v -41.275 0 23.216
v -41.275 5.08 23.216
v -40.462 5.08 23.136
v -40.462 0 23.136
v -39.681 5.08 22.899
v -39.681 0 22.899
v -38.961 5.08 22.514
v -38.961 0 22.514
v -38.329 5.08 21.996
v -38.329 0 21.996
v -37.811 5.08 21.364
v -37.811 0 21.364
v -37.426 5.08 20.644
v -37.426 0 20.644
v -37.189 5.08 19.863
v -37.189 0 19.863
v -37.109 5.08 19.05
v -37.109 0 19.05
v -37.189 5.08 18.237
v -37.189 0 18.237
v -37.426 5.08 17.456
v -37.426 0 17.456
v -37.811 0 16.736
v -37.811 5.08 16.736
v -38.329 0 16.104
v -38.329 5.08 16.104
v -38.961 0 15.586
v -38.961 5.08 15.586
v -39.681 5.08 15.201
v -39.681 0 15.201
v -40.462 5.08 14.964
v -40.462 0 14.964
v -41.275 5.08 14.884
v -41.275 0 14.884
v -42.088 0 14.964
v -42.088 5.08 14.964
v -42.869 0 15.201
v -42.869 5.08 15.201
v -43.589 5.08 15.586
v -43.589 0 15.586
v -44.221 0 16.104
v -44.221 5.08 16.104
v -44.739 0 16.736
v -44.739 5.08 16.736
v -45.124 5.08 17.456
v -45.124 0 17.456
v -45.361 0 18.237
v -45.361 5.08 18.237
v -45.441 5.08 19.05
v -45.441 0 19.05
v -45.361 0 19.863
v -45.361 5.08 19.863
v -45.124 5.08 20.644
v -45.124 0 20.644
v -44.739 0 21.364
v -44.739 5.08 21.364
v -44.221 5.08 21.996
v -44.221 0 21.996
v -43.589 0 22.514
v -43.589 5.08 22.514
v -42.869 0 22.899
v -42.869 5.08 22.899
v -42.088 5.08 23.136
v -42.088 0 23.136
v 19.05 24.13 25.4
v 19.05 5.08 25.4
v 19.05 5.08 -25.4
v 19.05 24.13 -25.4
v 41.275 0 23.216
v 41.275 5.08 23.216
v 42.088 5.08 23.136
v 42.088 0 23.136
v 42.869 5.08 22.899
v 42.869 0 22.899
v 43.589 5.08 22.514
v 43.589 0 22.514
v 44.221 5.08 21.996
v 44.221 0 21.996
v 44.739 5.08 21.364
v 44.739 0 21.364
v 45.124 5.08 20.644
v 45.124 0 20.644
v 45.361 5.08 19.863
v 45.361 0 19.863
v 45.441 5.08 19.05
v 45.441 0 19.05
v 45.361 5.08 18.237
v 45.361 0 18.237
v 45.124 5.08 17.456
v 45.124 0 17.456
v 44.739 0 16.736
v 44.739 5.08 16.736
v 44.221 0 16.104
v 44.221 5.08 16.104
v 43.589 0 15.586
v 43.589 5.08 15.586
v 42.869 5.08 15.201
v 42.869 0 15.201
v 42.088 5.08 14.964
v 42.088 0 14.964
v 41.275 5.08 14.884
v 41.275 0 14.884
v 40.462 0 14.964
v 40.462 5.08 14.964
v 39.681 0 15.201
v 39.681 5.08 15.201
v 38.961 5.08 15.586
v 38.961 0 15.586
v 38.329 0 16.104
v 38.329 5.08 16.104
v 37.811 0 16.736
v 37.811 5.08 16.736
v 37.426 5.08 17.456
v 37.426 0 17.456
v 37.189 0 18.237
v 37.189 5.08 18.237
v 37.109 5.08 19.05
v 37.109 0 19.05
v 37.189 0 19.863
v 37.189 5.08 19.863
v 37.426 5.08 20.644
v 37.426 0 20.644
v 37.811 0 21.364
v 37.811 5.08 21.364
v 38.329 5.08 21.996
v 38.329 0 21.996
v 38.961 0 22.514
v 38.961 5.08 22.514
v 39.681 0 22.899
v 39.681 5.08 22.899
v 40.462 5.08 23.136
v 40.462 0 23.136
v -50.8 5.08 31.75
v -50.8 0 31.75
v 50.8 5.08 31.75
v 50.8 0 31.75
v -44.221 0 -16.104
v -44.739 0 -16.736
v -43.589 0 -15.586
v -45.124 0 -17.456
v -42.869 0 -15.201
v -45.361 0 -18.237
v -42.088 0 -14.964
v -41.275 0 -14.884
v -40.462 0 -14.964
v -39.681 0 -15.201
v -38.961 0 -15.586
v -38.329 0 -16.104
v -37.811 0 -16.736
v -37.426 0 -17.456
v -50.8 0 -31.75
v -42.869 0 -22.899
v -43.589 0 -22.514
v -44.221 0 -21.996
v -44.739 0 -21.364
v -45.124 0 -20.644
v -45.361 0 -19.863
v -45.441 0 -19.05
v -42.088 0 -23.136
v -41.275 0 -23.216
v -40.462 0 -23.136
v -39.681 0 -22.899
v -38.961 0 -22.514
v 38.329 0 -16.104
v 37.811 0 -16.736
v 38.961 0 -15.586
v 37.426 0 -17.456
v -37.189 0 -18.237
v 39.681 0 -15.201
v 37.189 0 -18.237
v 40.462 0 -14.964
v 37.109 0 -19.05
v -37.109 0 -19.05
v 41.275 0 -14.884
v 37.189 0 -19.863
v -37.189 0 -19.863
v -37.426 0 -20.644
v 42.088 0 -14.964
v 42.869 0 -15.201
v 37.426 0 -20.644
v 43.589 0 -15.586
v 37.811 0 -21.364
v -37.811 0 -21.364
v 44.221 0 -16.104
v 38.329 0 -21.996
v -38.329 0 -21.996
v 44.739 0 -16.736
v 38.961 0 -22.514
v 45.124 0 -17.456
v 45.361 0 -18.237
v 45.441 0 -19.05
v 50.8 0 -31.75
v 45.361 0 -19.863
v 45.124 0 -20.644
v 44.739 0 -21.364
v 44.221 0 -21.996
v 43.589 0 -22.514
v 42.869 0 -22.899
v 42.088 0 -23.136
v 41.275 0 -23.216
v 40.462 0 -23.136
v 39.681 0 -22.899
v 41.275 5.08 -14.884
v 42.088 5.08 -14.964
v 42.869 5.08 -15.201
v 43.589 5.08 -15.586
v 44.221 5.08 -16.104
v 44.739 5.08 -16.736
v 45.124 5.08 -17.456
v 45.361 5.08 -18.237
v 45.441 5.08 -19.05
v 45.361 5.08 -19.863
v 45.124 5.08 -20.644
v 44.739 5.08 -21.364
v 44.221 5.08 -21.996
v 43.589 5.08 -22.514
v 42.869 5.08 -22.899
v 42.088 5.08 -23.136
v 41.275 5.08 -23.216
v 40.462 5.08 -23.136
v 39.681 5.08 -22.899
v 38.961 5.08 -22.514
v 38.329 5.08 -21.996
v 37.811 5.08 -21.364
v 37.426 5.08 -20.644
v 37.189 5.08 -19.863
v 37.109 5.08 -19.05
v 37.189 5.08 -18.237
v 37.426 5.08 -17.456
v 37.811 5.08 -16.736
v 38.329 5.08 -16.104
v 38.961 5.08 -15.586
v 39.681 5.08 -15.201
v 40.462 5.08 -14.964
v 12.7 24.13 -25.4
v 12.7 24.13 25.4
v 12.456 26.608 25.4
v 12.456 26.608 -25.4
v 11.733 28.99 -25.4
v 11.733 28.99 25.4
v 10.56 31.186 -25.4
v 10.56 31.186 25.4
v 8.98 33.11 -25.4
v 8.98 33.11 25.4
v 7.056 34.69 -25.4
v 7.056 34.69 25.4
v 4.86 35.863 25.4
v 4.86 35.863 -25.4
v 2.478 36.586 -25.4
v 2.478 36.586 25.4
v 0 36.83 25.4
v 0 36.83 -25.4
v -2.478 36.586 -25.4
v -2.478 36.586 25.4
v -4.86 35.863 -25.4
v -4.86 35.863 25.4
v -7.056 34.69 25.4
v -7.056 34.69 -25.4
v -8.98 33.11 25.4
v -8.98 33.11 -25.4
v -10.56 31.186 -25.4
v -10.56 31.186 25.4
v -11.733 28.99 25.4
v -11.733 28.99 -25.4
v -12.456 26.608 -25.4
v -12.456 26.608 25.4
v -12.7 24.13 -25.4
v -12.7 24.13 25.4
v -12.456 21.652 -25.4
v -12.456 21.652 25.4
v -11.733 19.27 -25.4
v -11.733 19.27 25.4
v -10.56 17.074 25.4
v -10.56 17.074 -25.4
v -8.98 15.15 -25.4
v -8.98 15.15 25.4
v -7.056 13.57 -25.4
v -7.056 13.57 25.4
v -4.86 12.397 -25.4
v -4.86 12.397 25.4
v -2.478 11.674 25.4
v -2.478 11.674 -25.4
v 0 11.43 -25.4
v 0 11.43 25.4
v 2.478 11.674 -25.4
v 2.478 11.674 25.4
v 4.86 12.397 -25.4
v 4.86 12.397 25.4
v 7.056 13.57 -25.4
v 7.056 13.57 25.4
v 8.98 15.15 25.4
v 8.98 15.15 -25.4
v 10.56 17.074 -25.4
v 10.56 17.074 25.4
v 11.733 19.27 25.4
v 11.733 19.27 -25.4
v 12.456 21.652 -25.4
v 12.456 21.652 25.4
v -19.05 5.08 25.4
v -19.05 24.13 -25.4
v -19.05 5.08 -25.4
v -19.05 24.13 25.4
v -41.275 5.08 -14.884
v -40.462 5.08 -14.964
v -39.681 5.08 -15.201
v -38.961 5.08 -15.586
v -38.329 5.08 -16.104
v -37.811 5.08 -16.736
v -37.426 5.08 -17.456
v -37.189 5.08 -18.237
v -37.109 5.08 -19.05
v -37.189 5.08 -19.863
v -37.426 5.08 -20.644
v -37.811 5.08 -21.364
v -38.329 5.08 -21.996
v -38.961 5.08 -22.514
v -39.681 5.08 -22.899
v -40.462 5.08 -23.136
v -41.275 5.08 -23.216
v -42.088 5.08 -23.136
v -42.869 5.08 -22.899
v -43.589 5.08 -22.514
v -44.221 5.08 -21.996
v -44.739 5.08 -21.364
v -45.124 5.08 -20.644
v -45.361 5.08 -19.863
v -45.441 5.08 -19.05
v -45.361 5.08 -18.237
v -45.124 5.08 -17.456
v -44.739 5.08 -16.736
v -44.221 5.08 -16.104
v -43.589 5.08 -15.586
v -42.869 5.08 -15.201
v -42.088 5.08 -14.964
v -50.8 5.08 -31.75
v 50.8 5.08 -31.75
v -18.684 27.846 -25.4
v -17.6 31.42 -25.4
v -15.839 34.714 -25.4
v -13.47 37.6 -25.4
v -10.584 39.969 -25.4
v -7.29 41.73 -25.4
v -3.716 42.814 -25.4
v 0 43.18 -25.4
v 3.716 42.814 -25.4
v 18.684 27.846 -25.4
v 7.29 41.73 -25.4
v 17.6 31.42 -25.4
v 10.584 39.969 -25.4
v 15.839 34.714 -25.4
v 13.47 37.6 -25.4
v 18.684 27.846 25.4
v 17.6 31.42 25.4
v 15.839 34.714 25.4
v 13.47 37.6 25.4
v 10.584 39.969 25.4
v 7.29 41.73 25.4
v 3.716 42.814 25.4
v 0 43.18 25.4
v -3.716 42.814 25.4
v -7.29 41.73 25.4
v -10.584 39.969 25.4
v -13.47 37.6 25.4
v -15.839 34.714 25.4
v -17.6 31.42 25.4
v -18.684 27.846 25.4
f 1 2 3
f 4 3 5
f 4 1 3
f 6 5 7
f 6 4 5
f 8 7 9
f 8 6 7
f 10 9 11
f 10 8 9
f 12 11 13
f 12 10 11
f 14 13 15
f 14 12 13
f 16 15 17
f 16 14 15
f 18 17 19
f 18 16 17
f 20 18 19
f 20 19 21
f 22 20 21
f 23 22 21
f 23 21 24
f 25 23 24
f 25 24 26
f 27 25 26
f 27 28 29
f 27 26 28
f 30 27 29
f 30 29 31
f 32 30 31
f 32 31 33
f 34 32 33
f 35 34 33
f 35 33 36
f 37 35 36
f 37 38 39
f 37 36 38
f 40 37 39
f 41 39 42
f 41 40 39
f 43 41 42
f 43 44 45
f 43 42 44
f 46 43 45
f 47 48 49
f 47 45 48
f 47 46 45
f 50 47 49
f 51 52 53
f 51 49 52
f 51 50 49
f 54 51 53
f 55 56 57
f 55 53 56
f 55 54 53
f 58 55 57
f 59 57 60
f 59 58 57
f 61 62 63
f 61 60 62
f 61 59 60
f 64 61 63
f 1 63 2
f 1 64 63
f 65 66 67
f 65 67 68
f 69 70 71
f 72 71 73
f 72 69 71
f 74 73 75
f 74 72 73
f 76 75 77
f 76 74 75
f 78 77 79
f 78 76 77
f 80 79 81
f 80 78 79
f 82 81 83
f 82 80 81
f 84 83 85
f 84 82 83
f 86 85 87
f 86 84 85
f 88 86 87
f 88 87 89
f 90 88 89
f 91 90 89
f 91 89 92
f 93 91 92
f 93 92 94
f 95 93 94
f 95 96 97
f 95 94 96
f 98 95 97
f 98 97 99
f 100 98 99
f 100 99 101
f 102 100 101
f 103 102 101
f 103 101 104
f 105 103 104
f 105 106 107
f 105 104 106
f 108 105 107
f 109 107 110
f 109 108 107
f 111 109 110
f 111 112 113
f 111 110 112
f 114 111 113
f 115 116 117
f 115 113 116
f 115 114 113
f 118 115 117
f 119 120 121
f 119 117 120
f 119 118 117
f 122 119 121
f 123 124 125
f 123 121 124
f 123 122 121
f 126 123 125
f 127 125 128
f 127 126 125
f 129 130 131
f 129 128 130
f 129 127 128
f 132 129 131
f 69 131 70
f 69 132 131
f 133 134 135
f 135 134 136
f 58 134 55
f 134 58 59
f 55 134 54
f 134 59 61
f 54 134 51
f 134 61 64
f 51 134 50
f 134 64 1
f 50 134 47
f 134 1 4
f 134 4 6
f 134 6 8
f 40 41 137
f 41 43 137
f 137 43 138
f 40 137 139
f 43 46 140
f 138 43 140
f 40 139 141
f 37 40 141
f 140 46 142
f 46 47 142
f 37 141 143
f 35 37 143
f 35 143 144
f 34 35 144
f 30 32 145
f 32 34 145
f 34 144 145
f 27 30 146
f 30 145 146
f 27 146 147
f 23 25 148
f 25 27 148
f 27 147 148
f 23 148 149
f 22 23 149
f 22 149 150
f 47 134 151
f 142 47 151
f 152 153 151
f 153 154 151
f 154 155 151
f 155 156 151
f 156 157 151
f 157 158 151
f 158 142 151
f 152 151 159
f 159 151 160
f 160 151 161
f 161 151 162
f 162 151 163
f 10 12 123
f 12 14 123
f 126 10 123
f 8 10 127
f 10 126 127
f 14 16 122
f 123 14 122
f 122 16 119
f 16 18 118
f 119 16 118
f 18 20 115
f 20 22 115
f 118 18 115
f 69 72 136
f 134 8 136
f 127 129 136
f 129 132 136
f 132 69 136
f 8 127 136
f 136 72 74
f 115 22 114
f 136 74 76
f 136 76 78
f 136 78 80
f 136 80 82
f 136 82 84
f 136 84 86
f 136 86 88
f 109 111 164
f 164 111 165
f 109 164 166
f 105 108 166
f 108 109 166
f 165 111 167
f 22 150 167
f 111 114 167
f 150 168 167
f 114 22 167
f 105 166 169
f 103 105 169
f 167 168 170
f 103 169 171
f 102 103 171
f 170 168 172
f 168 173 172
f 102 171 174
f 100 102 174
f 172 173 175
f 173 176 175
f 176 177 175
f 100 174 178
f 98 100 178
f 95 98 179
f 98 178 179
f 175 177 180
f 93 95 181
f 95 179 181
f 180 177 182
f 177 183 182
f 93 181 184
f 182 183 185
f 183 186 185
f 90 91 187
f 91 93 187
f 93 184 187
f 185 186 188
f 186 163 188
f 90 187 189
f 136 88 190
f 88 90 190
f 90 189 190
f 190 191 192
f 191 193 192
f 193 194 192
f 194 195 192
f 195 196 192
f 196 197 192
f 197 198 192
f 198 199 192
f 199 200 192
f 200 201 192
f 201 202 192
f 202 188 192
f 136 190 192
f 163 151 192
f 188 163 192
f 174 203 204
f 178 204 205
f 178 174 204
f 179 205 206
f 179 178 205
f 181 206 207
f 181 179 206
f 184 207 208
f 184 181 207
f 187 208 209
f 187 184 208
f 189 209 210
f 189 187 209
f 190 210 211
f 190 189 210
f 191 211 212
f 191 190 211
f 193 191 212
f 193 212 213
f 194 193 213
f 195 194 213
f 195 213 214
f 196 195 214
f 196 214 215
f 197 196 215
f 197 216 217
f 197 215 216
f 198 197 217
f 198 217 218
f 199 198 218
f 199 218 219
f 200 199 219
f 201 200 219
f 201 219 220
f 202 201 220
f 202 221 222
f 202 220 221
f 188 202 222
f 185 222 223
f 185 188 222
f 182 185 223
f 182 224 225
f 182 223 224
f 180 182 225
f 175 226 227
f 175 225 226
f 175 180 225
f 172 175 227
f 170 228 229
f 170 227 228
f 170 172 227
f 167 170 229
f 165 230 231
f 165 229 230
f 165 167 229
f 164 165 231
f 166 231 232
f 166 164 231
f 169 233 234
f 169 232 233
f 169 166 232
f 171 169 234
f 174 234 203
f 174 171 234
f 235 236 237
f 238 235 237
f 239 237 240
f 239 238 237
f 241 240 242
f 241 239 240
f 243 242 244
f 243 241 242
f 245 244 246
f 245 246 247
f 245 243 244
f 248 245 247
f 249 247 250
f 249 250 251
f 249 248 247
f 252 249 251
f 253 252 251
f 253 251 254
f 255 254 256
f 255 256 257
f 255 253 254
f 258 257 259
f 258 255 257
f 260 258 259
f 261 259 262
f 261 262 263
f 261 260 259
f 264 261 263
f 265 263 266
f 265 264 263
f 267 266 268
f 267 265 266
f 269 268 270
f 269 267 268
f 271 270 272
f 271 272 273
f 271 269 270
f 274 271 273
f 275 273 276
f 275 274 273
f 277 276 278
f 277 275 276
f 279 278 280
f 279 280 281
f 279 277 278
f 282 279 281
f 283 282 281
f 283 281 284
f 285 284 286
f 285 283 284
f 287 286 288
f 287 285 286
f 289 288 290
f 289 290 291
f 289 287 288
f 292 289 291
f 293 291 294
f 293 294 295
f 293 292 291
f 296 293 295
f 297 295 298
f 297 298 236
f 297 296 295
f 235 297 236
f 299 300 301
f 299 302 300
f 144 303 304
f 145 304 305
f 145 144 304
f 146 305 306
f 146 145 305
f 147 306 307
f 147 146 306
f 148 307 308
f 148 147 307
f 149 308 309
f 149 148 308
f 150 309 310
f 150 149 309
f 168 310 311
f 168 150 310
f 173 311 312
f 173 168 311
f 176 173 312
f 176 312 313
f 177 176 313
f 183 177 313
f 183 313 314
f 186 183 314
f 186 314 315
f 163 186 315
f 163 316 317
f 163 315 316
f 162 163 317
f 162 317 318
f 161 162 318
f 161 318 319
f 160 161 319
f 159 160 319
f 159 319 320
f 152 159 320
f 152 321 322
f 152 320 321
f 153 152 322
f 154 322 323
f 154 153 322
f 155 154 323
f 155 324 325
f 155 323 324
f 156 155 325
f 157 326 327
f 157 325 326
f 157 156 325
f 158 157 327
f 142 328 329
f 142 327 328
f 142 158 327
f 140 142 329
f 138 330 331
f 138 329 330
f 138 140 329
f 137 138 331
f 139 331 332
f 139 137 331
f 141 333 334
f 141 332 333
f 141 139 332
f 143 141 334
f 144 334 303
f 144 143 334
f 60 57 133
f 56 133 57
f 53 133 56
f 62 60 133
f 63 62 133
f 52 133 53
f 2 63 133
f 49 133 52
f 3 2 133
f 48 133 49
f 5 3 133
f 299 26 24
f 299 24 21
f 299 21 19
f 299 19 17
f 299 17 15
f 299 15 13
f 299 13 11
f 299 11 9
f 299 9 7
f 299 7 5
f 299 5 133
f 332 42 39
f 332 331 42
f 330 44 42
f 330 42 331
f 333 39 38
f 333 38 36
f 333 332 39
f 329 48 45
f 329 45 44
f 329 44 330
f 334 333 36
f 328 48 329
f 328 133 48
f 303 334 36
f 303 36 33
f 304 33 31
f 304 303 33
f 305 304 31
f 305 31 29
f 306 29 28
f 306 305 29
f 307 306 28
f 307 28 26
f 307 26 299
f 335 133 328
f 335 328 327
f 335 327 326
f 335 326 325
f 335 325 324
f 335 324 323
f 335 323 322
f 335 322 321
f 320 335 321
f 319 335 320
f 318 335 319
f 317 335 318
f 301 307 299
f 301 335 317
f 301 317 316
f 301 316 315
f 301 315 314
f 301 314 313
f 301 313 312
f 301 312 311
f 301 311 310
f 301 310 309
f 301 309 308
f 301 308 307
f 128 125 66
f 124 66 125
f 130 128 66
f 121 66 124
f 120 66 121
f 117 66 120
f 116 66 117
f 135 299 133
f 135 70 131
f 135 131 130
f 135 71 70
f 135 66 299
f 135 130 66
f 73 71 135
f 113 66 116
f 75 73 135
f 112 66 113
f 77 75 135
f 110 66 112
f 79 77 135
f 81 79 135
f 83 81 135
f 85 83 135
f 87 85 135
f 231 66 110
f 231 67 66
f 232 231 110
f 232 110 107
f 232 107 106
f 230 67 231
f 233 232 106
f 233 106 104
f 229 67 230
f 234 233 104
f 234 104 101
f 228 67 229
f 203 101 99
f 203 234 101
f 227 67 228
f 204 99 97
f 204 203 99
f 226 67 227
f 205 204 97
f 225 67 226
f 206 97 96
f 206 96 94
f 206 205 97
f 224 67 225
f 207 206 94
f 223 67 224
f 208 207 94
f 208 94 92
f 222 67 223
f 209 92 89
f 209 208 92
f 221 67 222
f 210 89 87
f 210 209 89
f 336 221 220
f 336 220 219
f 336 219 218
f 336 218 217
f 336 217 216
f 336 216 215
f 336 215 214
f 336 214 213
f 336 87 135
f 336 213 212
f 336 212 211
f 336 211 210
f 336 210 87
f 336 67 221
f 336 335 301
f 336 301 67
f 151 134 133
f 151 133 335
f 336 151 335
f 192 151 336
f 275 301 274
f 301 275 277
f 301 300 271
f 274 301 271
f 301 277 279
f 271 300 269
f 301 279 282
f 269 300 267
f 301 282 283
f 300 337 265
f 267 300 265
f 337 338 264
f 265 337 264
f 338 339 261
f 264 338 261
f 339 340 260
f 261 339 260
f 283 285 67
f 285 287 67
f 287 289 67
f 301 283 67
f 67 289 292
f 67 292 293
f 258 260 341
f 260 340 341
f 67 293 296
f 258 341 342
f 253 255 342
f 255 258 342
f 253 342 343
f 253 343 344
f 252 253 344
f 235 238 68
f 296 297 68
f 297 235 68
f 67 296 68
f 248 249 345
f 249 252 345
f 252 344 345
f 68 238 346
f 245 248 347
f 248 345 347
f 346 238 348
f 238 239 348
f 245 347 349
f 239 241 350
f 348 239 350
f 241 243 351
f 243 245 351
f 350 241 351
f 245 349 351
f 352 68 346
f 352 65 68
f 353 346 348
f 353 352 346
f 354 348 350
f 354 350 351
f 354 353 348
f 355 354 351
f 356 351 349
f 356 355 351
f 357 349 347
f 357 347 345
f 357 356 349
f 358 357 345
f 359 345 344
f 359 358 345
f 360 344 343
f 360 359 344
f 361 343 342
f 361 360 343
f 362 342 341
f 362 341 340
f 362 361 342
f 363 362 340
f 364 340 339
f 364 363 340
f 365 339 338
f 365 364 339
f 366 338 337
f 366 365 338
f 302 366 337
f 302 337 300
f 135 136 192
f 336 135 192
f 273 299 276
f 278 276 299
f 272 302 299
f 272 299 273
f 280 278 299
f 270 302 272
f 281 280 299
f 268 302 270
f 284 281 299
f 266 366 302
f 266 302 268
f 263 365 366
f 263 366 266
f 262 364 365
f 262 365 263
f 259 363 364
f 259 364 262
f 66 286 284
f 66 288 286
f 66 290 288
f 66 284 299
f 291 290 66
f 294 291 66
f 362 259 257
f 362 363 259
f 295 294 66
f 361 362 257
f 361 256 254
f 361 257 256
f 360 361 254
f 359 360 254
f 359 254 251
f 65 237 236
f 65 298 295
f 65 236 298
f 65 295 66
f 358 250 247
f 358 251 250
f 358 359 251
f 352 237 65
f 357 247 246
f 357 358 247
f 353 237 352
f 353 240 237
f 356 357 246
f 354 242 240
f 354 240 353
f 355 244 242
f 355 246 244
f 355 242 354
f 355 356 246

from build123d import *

# Parameters (mm, degrees)
SKETCH1_W           = 101.6
SKETCH1_H           = 63.5
BOSS_EXTRUDE1_DEPTH = 5.08
SKETCH2_R           = 4.1656
CUT_EXTRUDE1_DEPTH  = 61.120785923
SKETCH3_R           = 12.7
BOSS_EXTRUDE2_DEPTH = 25.4


with BuildPart() as part:
    # Sketch1 → Boss-Extrude1 (new body)
    with BuildSketch(Plane(origin=(0, 0, 0), x_dir=(1, 0, 0), z_dir=(0, 1, 0))):
        Rectangle(SKETCH1_W, SKETCH1_H)
    extrude(amount=BOSS_EXTRUDE1_DEPTH)

    # Sketch2 → Cut-Extrude1 (cut, through all)
    with BuildSketch(Plane(origin=(0, 0, 0), x_dir=(1, 0, 0), z_dir=(0, 1, 0))):
        with Locations(Location((-41.275, 19.05, 0), (0, 0, 270))):
            Circle(SKETCH2_R)
        with Locations(Location((41.275, 19.05, 0), (0, 0, 270))):
            Circle(SKETCH2_R)
        with Locations(Location((41.275, -19.05, 0), (0, 0, 270))):
            Circle(SKETCH2_R)
        with Locations(Location((-41.275, -19.05, 0), (0, 0, 270))):
            Circle(SKETCH2_R)
    extrude(amount=CUT_EXTRUDE1_DEPTH, mode=Mode.SUBTRACT)

    # Sketch3 → Boss-Extrude2 (add, symmetric)
    with BuildSketch(Plane.XY):
        with BuildLine():
            Line((-19.05, 24.13), (-19.05, 5.08))
            Line((-19.05, 5.08), (19.05, 5.08))
            Line((19.05, 5.08), (19.05, 24.13))
            ThreePointArc((19.05, 24.13), (0, 43.18), (-19.05, 24.13))
        make_face()
        with Locations((0, 24.13)):
            Circle(SKETCH3_R, mode=Mode.SUBTRACT)
    extrude(amount=BOSS_EXTRUDE2_DEPTH, both=True)


solid = part.part
